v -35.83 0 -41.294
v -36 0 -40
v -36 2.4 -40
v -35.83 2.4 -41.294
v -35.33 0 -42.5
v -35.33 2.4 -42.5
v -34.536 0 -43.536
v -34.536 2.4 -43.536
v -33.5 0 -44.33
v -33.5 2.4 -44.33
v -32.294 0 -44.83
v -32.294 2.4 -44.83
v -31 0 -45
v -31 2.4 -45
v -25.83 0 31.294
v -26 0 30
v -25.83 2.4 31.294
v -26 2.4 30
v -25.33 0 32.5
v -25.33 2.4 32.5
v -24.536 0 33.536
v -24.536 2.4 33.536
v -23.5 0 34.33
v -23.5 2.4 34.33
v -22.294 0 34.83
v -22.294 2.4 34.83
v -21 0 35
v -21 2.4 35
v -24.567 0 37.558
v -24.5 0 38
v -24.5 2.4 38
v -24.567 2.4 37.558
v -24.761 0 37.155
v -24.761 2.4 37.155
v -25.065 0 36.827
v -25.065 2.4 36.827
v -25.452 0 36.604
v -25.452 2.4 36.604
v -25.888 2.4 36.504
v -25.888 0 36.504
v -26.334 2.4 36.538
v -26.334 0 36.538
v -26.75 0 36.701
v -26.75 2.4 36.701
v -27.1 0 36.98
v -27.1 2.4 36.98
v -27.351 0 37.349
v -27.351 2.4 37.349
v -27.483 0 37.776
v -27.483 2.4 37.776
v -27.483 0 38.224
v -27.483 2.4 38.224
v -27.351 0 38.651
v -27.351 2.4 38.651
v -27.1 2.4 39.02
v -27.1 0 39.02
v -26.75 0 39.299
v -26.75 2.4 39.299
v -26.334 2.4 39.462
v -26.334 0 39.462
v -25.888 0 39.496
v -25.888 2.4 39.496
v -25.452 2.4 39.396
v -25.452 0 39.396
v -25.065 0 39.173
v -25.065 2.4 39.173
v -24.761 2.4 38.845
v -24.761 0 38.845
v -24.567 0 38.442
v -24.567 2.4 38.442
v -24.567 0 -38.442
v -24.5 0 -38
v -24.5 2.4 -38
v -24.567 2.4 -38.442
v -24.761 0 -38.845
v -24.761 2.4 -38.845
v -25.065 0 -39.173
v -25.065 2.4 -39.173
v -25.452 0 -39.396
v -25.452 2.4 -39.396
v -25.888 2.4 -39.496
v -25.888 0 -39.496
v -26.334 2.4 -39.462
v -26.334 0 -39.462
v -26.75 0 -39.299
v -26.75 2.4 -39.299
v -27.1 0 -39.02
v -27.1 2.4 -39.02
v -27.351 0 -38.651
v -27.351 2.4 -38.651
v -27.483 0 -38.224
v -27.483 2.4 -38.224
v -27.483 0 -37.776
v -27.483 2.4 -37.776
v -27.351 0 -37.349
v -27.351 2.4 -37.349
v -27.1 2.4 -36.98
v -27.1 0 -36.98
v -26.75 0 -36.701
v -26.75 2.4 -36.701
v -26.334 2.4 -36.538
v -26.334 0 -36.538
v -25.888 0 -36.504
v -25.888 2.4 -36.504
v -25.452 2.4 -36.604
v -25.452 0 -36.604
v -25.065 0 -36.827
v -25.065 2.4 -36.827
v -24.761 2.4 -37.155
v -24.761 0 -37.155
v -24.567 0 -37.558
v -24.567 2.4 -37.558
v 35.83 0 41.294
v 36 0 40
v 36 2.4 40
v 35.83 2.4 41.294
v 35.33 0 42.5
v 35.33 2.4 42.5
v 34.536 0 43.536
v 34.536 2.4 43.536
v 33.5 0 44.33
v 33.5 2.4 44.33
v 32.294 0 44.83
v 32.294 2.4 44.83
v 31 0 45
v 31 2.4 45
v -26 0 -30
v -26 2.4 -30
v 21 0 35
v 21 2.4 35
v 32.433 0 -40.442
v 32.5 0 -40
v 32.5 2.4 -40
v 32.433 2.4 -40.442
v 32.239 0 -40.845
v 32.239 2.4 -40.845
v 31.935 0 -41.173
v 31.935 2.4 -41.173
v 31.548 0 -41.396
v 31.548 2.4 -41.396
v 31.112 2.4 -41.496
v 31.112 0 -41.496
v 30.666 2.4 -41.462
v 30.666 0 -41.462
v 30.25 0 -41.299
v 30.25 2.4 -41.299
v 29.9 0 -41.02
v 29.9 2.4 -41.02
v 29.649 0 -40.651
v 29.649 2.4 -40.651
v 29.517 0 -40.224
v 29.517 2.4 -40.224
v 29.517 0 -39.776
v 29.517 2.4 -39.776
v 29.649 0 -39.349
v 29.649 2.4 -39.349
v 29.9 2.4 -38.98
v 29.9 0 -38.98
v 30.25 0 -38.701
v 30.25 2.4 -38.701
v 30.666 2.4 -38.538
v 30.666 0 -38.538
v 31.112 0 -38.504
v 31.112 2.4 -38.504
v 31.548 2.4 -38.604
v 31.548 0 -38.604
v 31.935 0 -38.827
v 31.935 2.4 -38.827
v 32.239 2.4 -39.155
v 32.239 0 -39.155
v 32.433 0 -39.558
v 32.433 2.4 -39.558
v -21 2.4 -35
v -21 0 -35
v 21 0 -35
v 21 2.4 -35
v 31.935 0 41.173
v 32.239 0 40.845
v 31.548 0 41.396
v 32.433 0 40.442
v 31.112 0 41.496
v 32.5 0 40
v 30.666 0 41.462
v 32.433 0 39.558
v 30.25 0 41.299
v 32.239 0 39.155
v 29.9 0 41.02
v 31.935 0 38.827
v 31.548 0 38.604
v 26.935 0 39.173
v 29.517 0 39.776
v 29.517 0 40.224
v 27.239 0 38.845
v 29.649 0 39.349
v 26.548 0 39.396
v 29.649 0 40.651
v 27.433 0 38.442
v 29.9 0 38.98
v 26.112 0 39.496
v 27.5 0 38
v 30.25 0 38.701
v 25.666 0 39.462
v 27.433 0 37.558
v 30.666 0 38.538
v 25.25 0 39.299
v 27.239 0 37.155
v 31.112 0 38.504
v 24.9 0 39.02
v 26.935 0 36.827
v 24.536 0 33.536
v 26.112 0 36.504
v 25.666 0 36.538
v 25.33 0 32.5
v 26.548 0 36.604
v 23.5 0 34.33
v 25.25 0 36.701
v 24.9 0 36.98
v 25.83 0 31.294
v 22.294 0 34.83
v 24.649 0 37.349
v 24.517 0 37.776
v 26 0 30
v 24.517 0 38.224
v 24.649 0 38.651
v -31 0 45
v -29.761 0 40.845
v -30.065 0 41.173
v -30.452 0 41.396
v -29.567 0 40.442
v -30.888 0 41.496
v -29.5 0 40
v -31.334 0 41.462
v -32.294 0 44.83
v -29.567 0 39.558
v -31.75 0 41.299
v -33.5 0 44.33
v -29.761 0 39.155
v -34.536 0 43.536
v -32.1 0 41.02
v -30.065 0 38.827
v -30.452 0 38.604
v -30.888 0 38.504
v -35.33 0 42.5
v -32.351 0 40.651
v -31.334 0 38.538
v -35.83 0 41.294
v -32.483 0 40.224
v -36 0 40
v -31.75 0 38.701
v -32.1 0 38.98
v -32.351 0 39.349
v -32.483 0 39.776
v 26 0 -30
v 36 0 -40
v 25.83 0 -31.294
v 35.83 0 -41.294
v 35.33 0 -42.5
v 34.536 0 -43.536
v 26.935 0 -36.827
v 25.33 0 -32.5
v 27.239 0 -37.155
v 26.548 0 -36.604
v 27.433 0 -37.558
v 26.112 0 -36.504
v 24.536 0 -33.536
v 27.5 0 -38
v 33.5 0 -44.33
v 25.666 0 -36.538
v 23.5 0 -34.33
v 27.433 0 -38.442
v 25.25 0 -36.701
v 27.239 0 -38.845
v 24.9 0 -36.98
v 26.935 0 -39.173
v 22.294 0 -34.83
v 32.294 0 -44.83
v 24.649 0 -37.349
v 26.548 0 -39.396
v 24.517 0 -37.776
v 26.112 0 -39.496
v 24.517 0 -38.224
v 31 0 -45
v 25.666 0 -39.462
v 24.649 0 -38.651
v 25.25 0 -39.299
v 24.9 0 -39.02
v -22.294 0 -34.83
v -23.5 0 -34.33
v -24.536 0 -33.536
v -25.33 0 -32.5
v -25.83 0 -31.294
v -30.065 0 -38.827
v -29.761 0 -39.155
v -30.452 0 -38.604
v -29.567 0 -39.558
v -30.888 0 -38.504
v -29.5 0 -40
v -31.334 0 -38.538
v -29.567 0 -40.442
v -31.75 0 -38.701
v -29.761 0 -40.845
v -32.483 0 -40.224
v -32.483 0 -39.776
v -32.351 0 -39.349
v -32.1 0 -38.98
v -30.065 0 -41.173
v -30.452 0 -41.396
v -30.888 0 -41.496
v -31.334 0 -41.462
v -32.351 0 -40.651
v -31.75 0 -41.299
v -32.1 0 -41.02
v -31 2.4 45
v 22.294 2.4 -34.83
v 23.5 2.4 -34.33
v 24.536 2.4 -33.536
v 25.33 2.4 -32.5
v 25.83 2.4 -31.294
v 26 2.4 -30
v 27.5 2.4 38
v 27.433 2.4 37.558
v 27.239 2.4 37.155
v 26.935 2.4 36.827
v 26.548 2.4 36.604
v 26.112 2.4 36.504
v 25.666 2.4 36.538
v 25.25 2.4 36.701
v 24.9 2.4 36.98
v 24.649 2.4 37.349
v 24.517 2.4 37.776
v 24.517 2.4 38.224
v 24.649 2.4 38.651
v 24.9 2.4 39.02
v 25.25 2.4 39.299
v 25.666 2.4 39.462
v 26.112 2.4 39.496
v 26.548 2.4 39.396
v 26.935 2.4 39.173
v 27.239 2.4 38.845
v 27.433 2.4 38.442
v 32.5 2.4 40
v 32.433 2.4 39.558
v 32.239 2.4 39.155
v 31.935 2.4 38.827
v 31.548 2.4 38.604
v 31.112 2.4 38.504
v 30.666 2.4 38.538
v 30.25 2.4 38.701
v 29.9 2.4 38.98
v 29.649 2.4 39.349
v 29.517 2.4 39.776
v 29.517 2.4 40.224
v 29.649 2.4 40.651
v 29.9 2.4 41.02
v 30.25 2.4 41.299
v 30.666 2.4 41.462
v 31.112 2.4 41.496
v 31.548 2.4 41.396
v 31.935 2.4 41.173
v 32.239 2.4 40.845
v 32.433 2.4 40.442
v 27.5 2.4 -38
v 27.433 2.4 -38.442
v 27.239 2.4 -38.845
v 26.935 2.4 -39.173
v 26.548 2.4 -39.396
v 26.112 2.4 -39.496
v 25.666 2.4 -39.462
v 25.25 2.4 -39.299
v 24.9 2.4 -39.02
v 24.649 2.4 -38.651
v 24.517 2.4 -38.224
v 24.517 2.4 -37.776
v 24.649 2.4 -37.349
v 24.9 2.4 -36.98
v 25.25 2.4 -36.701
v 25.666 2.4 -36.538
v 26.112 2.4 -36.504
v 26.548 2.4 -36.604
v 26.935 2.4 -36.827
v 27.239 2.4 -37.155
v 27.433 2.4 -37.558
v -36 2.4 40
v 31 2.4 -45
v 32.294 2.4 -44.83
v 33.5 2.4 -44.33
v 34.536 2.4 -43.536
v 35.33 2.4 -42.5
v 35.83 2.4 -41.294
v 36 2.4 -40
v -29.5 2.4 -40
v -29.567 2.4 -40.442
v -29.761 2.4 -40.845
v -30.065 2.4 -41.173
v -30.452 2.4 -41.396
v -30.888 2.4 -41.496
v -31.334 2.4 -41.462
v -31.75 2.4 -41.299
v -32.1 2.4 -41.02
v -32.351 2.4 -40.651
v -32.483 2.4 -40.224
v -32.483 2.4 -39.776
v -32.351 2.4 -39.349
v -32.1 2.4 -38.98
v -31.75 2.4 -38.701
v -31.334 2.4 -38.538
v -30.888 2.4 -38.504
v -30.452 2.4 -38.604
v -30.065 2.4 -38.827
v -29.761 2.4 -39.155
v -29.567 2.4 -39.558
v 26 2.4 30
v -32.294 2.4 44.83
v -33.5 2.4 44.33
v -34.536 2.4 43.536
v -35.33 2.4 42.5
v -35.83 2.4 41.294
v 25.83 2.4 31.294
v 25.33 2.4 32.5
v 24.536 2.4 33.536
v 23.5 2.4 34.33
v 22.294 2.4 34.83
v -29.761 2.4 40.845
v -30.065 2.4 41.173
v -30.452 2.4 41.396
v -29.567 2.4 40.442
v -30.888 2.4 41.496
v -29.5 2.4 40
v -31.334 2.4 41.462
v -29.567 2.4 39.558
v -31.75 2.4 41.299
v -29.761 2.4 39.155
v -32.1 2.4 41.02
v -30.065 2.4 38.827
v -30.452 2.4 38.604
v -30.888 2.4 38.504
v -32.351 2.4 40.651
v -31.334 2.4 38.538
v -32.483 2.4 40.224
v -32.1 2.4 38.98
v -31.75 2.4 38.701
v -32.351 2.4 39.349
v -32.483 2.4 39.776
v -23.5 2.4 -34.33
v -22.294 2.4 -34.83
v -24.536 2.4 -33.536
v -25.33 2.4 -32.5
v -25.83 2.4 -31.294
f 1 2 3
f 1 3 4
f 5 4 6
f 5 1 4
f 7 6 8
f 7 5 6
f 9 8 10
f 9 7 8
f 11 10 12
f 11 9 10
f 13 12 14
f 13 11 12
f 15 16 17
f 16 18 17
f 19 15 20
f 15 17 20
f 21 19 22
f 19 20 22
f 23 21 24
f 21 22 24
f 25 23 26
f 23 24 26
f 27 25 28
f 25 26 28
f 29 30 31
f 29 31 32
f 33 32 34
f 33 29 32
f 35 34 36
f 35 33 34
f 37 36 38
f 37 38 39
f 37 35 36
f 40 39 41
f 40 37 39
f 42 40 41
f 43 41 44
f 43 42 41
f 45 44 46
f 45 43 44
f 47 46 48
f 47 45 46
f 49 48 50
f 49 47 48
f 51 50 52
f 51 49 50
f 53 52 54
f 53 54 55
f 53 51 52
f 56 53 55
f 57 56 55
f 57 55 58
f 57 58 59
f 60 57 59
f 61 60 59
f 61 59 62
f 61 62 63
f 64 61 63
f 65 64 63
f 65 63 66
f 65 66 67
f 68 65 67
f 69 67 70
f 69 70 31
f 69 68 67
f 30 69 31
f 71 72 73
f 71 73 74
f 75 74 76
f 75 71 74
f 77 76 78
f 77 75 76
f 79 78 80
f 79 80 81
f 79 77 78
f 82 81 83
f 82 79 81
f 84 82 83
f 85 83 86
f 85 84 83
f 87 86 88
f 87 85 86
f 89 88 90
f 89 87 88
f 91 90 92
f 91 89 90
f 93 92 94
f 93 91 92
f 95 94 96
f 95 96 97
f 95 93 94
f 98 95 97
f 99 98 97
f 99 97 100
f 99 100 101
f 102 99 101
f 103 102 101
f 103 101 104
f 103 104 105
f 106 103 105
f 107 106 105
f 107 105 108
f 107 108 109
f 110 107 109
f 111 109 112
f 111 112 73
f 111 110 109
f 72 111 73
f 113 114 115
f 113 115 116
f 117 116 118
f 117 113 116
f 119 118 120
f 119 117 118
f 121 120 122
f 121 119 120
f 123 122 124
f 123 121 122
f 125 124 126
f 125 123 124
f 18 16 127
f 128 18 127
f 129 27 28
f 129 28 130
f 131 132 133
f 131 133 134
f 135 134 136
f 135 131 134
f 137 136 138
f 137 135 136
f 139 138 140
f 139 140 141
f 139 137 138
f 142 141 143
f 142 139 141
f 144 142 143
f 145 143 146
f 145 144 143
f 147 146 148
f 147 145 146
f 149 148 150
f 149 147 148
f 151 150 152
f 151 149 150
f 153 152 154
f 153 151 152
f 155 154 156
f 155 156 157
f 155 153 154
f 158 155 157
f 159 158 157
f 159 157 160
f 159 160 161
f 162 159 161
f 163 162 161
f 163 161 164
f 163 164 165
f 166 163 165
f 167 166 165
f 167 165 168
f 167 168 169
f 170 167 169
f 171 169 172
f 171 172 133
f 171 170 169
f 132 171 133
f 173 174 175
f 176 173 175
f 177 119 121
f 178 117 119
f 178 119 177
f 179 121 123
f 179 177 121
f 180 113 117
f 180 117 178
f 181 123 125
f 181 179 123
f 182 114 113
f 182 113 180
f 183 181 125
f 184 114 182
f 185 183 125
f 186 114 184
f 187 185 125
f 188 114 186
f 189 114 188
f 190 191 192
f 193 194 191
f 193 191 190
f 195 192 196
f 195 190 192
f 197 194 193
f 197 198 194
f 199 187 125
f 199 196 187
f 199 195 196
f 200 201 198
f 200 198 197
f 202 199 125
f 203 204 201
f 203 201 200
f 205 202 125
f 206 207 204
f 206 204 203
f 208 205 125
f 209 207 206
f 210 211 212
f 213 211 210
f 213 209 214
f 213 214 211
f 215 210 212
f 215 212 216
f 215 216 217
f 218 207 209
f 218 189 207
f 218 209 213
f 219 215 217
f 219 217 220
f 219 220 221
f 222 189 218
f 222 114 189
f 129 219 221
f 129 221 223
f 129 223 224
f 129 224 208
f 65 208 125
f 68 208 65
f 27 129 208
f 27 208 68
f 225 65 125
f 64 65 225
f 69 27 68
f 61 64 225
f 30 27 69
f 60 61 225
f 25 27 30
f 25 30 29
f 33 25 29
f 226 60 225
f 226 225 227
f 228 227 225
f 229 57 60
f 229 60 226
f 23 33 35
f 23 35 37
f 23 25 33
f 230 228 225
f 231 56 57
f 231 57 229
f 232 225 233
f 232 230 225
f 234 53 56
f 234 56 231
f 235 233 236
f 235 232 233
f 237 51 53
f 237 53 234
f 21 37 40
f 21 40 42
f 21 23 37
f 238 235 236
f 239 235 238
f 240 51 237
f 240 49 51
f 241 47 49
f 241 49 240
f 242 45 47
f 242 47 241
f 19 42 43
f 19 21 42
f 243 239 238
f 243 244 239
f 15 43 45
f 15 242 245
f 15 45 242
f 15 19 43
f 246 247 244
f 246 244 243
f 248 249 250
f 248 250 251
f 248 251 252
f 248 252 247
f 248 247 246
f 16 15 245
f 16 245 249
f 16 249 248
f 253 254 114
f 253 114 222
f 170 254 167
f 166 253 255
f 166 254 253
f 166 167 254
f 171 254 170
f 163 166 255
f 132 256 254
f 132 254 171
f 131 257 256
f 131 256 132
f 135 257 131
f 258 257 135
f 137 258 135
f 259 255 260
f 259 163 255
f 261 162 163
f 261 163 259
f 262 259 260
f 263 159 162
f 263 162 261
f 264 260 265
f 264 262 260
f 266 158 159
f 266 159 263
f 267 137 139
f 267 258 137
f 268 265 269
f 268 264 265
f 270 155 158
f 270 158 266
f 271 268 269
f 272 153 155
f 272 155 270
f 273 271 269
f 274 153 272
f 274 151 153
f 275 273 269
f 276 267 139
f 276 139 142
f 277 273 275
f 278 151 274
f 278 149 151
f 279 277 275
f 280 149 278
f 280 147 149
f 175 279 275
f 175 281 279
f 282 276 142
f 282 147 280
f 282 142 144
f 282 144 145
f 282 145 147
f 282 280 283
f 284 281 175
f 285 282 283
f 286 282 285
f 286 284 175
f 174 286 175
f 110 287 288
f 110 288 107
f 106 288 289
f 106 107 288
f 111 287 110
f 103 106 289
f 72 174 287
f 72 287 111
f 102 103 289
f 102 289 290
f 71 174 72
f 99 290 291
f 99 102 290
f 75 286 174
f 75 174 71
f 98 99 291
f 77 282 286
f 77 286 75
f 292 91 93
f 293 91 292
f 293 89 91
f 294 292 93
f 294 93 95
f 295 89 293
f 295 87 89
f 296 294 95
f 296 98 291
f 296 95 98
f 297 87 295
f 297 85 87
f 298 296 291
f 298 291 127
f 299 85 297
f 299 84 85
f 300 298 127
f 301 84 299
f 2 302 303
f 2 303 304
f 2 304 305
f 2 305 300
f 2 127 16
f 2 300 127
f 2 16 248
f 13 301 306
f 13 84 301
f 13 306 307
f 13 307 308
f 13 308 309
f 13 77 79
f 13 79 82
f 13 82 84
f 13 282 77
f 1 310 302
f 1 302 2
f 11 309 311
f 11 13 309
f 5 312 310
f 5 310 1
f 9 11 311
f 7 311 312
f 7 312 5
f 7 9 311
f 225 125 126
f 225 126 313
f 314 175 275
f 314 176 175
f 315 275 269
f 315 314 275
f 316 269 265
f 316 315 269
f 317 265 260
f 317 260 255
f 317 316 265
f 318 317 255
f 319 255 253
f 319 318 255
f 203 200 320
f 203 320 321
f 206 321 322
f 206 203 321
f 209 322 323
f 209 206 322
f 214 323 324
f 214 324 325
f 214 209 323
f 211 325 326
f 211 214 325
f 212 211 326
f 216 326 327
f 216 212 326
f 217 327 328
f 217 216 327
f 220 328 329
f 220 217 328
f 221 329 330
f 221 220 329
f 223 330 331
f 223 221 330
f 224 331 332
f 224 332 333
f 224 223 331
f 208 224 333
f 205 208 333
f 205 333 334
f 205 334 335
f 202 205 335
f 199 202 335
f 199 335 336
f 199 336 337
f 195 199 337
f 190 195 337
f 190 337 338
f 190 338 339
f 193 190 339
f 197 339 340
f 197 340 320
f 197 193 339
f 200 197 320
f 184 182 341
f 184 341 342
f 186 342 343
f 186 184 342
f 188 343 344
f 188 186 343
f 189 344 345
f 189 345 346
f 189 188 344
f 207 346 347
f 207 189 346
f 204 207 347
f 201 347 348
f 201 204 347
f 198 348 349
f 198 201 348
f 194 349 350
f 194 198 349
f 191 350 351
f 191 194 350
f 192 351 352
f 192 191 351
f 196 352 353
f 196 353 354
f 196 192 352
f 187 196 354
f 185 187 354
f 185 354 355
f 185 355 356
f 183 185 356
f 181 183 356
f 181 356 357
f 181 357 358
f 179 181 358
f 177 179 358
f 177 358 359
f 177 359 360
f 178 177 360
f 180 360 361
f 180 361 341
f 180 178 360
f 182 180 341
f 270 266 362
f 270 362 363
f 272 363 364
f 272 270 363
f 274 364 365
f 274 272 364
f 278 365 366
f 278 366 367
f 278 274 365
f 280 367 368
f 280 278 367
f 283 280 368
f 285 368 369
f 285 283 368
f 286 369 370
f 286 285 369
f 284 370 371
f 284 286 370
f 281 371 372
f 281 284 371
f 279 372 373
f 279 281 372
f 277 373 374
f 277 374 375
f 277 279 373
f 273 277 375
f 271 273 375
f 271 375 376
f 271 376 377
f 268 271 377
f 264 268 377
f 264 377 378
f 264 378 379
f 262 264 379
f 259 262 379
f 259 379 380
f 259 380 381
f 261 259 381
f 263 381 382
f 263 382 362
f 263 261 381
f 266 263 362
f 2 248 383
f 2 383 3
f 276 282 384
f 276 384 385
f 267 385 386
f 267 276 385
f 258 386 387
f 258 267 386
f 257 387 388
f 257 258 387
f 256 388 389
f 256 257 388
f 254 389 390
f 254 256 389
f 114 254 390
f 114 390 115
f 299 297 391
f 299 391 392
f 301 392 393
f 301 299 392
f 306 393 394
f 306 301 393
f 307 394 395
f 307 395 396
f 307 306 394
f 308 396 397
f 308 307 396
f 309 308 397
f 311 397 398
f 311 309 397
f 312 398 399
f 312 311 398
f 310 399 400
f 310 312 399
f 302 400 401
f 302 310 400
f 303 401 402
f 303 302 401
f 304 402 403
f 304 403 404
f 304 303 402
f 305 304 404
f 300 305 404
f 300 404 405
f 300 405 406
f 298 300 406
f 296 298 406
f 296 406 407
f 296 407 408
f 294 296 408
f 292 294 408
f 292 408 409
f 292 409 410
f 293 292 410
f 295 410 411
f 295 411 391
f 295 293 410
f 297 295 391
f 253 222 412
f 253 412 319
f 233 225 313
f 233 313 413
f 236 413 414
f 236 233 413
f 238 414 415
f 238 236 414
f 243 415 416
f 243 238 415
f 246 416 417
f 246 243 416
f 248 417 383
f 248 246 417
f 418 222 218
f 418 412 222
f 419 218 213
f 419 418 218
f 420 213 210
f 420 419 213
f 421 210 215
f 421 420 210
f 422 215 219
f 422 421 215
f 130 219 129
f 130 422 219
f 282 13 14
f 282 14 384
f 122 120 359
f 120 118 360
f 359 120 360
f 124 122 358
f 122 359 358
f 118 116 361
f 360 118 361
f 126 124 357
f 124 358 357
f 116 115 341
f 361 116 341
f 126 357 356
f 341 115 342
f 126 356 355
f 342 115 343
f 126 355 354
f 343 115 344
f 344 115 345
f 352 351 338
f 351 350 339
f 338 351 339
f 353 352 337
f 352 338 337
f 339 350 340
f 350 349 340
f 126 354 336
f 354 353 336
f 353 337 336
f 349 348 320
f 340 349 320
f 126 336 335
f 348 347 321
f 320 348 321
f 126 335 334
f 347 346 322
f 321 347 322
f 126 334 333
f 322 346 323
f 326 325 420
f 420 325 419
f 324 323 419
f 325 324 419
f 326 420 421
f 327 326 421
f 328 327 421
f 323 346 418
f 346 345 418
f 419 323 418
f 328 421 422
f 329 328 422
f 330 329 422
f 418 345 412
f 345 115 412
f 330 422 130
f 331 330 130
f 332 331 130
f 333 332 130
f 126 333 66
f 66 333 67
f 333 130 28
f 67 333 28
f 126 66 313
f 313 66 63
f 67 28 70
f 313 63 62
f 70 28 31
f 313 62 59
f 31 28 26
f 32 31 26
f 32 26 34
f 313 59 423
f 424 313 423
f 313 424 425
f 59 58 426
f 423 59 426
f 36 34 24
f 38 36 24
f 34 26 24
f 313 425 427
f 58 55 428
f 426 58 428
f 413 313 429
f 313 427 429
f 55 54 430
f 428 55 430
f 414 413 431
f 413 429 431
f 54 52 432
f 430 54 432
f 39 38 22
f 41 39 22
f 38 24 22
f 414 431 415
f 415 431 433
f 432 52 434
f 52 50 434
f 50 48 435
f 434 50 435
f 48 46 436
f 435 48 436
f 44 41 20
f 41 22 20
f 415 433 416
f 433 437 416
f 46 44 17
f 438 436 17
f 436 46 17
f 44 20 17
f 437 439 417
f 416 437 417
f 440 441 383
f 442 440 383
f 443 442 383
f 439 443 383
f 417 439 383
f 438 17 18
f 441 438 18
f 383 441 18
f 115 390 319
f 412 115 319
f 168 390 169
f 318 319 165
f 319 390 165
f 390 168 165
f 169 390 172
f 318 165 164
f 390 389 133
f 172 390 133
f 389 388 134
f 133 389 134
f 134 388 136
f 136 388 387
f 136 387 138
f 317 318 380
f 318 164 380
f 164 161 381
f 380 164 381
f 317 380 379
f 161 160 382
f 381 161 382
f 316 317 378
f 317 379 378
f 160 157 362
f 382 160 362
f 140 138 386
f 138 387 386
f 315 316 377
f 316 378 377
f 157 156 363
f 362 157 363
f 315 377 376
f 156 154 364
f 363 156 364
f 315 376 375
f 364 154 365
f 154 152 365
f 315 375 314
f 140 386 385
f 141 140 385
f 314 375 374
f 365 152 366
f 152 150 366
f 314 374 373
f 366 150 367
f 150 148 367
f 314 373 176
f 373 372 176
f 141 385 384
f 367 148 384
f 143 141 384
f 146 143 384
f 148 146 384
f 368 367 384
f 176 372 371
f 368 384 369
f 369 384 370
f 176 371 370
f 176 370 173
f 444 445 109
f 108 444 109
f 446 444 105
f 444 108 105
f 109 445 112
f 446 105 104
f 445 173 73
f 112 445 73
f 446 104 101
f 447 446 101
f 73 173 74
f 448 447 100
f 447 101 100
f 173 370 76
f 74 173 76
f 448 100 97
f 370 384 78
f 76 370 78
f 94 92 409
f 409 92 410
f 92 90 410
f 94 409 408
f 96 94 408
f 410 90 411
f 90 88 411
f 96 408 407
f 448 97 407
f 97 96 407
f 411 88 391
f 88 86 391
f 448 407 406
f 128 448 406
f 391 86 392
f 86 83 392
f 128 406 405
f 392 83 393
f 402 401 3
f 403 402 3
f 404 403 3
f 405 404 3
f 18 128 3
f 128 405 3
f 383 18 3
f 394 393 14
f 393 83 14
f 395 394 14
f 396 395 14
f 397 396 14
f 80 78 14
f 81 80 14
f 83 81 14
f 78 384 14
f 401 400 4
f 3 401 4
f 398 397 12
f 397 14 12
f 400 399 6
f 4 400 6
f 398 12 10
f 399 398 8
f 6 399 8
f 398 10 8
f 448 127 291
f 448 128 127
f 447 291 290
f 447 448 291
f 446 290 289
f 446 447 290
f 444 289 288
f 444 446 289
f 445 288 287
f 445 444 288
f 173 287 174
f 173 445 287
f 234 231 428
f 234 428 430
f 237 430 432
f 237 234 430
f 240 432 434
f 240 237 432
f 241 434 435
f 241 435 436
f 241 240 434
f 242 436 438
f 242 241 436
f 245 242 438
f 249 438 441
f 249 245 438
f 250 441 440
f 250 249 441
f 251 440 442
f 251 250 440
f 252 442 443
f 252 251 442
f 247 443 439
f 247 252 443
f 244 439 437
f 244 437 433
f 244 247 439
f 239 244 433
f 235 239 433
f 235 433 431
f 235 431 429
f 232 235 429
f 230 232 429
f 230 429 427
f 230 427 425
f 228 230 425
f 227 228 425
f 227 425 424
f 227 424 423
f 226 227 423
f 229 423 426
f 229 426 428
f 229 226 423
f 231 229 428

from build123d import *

# Parameters (mm, degrees)
SKETCH_1_R      = 1.5
SKETCH_1_W      = 52
SKETCH_1_H      = 70
EXTRUDE_1_DEPTH = 2.4
FILLET_1_R      = 5


with BuildPart() as part:
    # 草圖1 → 填料-伸長1 (new body)
    with BuildSketch(Plane(origin=(0, 0, 0), x_dir=(1, 0, 0), z_dir=(0, 1, 0))):
        with BuildLine():
            Line((-31, 45), (31, 45))
            ThreePointArc((31, 45), (34.535533906, 43.535533906), (36, 40))
            Line((36, 40), (36, -40))
            ThreePointArc((36, -40), (34.535533906, -43.535533906), (31, -45))
            Line((31, -45), (-31, -45))
            ThreePointArc((-31, -45), (-34.535533906, -43.535533906), (-36, -40))
            Line((-36, -40), (-36, 40))
            ThreePointArc((-36, 40), (-34.535533906, 43.535533906), (-31, 45))
        make_face()
        with Locations((-26, 38)):
            Circle(SKETCH_1_R, mode=Mode.SUBTRACT)
        with Locations((26, 38)):
            Circle(SKETCH_1_R, mode=Mode.SUBTRACT)
        with Locations((26, -38)):
            Circle(SKETCH_1_R, mode=Mode.SUBTRACT)
        with Locations((-26, -38)):
            Circle(SKETCH_1_R, mode=Mode.SUBTRACT)
        with Locations((-31, 40)):
            Circle(SKETCH_1_R, mode=Mode.SUBTRACT)
        with Locations((31, 40)):
            Circle(SKETCH_1_R, mode=Mode.SUBTRACT)
        with Locations((-31, -40)):
            Circle(SKETCH_1_R, mode=Mode.SUBTRACT)
        with Locations((31, -40)):
            Circle(SKETCH_1_R, mode=Mode.SUBTRACT)
        Rectangle(SKETCH_1_W, SKETCH_1_H, mode=Mode.SUBTRACT)
    extrude(amount=EXTRUDE_1_DEPTH)

    # 圓角1
    fillet_1_edges = [part.edges().sort_by_distance(p)[0] for p in [
        (26, 1.2, -35),
        (-26, 1.2, -35),
        (-26, 1.2, 35),
        (26, 1.2, 35),
    ]]
    fillet(fillet_1_edges, radius=FILLET_1_R)


solid = part.part
